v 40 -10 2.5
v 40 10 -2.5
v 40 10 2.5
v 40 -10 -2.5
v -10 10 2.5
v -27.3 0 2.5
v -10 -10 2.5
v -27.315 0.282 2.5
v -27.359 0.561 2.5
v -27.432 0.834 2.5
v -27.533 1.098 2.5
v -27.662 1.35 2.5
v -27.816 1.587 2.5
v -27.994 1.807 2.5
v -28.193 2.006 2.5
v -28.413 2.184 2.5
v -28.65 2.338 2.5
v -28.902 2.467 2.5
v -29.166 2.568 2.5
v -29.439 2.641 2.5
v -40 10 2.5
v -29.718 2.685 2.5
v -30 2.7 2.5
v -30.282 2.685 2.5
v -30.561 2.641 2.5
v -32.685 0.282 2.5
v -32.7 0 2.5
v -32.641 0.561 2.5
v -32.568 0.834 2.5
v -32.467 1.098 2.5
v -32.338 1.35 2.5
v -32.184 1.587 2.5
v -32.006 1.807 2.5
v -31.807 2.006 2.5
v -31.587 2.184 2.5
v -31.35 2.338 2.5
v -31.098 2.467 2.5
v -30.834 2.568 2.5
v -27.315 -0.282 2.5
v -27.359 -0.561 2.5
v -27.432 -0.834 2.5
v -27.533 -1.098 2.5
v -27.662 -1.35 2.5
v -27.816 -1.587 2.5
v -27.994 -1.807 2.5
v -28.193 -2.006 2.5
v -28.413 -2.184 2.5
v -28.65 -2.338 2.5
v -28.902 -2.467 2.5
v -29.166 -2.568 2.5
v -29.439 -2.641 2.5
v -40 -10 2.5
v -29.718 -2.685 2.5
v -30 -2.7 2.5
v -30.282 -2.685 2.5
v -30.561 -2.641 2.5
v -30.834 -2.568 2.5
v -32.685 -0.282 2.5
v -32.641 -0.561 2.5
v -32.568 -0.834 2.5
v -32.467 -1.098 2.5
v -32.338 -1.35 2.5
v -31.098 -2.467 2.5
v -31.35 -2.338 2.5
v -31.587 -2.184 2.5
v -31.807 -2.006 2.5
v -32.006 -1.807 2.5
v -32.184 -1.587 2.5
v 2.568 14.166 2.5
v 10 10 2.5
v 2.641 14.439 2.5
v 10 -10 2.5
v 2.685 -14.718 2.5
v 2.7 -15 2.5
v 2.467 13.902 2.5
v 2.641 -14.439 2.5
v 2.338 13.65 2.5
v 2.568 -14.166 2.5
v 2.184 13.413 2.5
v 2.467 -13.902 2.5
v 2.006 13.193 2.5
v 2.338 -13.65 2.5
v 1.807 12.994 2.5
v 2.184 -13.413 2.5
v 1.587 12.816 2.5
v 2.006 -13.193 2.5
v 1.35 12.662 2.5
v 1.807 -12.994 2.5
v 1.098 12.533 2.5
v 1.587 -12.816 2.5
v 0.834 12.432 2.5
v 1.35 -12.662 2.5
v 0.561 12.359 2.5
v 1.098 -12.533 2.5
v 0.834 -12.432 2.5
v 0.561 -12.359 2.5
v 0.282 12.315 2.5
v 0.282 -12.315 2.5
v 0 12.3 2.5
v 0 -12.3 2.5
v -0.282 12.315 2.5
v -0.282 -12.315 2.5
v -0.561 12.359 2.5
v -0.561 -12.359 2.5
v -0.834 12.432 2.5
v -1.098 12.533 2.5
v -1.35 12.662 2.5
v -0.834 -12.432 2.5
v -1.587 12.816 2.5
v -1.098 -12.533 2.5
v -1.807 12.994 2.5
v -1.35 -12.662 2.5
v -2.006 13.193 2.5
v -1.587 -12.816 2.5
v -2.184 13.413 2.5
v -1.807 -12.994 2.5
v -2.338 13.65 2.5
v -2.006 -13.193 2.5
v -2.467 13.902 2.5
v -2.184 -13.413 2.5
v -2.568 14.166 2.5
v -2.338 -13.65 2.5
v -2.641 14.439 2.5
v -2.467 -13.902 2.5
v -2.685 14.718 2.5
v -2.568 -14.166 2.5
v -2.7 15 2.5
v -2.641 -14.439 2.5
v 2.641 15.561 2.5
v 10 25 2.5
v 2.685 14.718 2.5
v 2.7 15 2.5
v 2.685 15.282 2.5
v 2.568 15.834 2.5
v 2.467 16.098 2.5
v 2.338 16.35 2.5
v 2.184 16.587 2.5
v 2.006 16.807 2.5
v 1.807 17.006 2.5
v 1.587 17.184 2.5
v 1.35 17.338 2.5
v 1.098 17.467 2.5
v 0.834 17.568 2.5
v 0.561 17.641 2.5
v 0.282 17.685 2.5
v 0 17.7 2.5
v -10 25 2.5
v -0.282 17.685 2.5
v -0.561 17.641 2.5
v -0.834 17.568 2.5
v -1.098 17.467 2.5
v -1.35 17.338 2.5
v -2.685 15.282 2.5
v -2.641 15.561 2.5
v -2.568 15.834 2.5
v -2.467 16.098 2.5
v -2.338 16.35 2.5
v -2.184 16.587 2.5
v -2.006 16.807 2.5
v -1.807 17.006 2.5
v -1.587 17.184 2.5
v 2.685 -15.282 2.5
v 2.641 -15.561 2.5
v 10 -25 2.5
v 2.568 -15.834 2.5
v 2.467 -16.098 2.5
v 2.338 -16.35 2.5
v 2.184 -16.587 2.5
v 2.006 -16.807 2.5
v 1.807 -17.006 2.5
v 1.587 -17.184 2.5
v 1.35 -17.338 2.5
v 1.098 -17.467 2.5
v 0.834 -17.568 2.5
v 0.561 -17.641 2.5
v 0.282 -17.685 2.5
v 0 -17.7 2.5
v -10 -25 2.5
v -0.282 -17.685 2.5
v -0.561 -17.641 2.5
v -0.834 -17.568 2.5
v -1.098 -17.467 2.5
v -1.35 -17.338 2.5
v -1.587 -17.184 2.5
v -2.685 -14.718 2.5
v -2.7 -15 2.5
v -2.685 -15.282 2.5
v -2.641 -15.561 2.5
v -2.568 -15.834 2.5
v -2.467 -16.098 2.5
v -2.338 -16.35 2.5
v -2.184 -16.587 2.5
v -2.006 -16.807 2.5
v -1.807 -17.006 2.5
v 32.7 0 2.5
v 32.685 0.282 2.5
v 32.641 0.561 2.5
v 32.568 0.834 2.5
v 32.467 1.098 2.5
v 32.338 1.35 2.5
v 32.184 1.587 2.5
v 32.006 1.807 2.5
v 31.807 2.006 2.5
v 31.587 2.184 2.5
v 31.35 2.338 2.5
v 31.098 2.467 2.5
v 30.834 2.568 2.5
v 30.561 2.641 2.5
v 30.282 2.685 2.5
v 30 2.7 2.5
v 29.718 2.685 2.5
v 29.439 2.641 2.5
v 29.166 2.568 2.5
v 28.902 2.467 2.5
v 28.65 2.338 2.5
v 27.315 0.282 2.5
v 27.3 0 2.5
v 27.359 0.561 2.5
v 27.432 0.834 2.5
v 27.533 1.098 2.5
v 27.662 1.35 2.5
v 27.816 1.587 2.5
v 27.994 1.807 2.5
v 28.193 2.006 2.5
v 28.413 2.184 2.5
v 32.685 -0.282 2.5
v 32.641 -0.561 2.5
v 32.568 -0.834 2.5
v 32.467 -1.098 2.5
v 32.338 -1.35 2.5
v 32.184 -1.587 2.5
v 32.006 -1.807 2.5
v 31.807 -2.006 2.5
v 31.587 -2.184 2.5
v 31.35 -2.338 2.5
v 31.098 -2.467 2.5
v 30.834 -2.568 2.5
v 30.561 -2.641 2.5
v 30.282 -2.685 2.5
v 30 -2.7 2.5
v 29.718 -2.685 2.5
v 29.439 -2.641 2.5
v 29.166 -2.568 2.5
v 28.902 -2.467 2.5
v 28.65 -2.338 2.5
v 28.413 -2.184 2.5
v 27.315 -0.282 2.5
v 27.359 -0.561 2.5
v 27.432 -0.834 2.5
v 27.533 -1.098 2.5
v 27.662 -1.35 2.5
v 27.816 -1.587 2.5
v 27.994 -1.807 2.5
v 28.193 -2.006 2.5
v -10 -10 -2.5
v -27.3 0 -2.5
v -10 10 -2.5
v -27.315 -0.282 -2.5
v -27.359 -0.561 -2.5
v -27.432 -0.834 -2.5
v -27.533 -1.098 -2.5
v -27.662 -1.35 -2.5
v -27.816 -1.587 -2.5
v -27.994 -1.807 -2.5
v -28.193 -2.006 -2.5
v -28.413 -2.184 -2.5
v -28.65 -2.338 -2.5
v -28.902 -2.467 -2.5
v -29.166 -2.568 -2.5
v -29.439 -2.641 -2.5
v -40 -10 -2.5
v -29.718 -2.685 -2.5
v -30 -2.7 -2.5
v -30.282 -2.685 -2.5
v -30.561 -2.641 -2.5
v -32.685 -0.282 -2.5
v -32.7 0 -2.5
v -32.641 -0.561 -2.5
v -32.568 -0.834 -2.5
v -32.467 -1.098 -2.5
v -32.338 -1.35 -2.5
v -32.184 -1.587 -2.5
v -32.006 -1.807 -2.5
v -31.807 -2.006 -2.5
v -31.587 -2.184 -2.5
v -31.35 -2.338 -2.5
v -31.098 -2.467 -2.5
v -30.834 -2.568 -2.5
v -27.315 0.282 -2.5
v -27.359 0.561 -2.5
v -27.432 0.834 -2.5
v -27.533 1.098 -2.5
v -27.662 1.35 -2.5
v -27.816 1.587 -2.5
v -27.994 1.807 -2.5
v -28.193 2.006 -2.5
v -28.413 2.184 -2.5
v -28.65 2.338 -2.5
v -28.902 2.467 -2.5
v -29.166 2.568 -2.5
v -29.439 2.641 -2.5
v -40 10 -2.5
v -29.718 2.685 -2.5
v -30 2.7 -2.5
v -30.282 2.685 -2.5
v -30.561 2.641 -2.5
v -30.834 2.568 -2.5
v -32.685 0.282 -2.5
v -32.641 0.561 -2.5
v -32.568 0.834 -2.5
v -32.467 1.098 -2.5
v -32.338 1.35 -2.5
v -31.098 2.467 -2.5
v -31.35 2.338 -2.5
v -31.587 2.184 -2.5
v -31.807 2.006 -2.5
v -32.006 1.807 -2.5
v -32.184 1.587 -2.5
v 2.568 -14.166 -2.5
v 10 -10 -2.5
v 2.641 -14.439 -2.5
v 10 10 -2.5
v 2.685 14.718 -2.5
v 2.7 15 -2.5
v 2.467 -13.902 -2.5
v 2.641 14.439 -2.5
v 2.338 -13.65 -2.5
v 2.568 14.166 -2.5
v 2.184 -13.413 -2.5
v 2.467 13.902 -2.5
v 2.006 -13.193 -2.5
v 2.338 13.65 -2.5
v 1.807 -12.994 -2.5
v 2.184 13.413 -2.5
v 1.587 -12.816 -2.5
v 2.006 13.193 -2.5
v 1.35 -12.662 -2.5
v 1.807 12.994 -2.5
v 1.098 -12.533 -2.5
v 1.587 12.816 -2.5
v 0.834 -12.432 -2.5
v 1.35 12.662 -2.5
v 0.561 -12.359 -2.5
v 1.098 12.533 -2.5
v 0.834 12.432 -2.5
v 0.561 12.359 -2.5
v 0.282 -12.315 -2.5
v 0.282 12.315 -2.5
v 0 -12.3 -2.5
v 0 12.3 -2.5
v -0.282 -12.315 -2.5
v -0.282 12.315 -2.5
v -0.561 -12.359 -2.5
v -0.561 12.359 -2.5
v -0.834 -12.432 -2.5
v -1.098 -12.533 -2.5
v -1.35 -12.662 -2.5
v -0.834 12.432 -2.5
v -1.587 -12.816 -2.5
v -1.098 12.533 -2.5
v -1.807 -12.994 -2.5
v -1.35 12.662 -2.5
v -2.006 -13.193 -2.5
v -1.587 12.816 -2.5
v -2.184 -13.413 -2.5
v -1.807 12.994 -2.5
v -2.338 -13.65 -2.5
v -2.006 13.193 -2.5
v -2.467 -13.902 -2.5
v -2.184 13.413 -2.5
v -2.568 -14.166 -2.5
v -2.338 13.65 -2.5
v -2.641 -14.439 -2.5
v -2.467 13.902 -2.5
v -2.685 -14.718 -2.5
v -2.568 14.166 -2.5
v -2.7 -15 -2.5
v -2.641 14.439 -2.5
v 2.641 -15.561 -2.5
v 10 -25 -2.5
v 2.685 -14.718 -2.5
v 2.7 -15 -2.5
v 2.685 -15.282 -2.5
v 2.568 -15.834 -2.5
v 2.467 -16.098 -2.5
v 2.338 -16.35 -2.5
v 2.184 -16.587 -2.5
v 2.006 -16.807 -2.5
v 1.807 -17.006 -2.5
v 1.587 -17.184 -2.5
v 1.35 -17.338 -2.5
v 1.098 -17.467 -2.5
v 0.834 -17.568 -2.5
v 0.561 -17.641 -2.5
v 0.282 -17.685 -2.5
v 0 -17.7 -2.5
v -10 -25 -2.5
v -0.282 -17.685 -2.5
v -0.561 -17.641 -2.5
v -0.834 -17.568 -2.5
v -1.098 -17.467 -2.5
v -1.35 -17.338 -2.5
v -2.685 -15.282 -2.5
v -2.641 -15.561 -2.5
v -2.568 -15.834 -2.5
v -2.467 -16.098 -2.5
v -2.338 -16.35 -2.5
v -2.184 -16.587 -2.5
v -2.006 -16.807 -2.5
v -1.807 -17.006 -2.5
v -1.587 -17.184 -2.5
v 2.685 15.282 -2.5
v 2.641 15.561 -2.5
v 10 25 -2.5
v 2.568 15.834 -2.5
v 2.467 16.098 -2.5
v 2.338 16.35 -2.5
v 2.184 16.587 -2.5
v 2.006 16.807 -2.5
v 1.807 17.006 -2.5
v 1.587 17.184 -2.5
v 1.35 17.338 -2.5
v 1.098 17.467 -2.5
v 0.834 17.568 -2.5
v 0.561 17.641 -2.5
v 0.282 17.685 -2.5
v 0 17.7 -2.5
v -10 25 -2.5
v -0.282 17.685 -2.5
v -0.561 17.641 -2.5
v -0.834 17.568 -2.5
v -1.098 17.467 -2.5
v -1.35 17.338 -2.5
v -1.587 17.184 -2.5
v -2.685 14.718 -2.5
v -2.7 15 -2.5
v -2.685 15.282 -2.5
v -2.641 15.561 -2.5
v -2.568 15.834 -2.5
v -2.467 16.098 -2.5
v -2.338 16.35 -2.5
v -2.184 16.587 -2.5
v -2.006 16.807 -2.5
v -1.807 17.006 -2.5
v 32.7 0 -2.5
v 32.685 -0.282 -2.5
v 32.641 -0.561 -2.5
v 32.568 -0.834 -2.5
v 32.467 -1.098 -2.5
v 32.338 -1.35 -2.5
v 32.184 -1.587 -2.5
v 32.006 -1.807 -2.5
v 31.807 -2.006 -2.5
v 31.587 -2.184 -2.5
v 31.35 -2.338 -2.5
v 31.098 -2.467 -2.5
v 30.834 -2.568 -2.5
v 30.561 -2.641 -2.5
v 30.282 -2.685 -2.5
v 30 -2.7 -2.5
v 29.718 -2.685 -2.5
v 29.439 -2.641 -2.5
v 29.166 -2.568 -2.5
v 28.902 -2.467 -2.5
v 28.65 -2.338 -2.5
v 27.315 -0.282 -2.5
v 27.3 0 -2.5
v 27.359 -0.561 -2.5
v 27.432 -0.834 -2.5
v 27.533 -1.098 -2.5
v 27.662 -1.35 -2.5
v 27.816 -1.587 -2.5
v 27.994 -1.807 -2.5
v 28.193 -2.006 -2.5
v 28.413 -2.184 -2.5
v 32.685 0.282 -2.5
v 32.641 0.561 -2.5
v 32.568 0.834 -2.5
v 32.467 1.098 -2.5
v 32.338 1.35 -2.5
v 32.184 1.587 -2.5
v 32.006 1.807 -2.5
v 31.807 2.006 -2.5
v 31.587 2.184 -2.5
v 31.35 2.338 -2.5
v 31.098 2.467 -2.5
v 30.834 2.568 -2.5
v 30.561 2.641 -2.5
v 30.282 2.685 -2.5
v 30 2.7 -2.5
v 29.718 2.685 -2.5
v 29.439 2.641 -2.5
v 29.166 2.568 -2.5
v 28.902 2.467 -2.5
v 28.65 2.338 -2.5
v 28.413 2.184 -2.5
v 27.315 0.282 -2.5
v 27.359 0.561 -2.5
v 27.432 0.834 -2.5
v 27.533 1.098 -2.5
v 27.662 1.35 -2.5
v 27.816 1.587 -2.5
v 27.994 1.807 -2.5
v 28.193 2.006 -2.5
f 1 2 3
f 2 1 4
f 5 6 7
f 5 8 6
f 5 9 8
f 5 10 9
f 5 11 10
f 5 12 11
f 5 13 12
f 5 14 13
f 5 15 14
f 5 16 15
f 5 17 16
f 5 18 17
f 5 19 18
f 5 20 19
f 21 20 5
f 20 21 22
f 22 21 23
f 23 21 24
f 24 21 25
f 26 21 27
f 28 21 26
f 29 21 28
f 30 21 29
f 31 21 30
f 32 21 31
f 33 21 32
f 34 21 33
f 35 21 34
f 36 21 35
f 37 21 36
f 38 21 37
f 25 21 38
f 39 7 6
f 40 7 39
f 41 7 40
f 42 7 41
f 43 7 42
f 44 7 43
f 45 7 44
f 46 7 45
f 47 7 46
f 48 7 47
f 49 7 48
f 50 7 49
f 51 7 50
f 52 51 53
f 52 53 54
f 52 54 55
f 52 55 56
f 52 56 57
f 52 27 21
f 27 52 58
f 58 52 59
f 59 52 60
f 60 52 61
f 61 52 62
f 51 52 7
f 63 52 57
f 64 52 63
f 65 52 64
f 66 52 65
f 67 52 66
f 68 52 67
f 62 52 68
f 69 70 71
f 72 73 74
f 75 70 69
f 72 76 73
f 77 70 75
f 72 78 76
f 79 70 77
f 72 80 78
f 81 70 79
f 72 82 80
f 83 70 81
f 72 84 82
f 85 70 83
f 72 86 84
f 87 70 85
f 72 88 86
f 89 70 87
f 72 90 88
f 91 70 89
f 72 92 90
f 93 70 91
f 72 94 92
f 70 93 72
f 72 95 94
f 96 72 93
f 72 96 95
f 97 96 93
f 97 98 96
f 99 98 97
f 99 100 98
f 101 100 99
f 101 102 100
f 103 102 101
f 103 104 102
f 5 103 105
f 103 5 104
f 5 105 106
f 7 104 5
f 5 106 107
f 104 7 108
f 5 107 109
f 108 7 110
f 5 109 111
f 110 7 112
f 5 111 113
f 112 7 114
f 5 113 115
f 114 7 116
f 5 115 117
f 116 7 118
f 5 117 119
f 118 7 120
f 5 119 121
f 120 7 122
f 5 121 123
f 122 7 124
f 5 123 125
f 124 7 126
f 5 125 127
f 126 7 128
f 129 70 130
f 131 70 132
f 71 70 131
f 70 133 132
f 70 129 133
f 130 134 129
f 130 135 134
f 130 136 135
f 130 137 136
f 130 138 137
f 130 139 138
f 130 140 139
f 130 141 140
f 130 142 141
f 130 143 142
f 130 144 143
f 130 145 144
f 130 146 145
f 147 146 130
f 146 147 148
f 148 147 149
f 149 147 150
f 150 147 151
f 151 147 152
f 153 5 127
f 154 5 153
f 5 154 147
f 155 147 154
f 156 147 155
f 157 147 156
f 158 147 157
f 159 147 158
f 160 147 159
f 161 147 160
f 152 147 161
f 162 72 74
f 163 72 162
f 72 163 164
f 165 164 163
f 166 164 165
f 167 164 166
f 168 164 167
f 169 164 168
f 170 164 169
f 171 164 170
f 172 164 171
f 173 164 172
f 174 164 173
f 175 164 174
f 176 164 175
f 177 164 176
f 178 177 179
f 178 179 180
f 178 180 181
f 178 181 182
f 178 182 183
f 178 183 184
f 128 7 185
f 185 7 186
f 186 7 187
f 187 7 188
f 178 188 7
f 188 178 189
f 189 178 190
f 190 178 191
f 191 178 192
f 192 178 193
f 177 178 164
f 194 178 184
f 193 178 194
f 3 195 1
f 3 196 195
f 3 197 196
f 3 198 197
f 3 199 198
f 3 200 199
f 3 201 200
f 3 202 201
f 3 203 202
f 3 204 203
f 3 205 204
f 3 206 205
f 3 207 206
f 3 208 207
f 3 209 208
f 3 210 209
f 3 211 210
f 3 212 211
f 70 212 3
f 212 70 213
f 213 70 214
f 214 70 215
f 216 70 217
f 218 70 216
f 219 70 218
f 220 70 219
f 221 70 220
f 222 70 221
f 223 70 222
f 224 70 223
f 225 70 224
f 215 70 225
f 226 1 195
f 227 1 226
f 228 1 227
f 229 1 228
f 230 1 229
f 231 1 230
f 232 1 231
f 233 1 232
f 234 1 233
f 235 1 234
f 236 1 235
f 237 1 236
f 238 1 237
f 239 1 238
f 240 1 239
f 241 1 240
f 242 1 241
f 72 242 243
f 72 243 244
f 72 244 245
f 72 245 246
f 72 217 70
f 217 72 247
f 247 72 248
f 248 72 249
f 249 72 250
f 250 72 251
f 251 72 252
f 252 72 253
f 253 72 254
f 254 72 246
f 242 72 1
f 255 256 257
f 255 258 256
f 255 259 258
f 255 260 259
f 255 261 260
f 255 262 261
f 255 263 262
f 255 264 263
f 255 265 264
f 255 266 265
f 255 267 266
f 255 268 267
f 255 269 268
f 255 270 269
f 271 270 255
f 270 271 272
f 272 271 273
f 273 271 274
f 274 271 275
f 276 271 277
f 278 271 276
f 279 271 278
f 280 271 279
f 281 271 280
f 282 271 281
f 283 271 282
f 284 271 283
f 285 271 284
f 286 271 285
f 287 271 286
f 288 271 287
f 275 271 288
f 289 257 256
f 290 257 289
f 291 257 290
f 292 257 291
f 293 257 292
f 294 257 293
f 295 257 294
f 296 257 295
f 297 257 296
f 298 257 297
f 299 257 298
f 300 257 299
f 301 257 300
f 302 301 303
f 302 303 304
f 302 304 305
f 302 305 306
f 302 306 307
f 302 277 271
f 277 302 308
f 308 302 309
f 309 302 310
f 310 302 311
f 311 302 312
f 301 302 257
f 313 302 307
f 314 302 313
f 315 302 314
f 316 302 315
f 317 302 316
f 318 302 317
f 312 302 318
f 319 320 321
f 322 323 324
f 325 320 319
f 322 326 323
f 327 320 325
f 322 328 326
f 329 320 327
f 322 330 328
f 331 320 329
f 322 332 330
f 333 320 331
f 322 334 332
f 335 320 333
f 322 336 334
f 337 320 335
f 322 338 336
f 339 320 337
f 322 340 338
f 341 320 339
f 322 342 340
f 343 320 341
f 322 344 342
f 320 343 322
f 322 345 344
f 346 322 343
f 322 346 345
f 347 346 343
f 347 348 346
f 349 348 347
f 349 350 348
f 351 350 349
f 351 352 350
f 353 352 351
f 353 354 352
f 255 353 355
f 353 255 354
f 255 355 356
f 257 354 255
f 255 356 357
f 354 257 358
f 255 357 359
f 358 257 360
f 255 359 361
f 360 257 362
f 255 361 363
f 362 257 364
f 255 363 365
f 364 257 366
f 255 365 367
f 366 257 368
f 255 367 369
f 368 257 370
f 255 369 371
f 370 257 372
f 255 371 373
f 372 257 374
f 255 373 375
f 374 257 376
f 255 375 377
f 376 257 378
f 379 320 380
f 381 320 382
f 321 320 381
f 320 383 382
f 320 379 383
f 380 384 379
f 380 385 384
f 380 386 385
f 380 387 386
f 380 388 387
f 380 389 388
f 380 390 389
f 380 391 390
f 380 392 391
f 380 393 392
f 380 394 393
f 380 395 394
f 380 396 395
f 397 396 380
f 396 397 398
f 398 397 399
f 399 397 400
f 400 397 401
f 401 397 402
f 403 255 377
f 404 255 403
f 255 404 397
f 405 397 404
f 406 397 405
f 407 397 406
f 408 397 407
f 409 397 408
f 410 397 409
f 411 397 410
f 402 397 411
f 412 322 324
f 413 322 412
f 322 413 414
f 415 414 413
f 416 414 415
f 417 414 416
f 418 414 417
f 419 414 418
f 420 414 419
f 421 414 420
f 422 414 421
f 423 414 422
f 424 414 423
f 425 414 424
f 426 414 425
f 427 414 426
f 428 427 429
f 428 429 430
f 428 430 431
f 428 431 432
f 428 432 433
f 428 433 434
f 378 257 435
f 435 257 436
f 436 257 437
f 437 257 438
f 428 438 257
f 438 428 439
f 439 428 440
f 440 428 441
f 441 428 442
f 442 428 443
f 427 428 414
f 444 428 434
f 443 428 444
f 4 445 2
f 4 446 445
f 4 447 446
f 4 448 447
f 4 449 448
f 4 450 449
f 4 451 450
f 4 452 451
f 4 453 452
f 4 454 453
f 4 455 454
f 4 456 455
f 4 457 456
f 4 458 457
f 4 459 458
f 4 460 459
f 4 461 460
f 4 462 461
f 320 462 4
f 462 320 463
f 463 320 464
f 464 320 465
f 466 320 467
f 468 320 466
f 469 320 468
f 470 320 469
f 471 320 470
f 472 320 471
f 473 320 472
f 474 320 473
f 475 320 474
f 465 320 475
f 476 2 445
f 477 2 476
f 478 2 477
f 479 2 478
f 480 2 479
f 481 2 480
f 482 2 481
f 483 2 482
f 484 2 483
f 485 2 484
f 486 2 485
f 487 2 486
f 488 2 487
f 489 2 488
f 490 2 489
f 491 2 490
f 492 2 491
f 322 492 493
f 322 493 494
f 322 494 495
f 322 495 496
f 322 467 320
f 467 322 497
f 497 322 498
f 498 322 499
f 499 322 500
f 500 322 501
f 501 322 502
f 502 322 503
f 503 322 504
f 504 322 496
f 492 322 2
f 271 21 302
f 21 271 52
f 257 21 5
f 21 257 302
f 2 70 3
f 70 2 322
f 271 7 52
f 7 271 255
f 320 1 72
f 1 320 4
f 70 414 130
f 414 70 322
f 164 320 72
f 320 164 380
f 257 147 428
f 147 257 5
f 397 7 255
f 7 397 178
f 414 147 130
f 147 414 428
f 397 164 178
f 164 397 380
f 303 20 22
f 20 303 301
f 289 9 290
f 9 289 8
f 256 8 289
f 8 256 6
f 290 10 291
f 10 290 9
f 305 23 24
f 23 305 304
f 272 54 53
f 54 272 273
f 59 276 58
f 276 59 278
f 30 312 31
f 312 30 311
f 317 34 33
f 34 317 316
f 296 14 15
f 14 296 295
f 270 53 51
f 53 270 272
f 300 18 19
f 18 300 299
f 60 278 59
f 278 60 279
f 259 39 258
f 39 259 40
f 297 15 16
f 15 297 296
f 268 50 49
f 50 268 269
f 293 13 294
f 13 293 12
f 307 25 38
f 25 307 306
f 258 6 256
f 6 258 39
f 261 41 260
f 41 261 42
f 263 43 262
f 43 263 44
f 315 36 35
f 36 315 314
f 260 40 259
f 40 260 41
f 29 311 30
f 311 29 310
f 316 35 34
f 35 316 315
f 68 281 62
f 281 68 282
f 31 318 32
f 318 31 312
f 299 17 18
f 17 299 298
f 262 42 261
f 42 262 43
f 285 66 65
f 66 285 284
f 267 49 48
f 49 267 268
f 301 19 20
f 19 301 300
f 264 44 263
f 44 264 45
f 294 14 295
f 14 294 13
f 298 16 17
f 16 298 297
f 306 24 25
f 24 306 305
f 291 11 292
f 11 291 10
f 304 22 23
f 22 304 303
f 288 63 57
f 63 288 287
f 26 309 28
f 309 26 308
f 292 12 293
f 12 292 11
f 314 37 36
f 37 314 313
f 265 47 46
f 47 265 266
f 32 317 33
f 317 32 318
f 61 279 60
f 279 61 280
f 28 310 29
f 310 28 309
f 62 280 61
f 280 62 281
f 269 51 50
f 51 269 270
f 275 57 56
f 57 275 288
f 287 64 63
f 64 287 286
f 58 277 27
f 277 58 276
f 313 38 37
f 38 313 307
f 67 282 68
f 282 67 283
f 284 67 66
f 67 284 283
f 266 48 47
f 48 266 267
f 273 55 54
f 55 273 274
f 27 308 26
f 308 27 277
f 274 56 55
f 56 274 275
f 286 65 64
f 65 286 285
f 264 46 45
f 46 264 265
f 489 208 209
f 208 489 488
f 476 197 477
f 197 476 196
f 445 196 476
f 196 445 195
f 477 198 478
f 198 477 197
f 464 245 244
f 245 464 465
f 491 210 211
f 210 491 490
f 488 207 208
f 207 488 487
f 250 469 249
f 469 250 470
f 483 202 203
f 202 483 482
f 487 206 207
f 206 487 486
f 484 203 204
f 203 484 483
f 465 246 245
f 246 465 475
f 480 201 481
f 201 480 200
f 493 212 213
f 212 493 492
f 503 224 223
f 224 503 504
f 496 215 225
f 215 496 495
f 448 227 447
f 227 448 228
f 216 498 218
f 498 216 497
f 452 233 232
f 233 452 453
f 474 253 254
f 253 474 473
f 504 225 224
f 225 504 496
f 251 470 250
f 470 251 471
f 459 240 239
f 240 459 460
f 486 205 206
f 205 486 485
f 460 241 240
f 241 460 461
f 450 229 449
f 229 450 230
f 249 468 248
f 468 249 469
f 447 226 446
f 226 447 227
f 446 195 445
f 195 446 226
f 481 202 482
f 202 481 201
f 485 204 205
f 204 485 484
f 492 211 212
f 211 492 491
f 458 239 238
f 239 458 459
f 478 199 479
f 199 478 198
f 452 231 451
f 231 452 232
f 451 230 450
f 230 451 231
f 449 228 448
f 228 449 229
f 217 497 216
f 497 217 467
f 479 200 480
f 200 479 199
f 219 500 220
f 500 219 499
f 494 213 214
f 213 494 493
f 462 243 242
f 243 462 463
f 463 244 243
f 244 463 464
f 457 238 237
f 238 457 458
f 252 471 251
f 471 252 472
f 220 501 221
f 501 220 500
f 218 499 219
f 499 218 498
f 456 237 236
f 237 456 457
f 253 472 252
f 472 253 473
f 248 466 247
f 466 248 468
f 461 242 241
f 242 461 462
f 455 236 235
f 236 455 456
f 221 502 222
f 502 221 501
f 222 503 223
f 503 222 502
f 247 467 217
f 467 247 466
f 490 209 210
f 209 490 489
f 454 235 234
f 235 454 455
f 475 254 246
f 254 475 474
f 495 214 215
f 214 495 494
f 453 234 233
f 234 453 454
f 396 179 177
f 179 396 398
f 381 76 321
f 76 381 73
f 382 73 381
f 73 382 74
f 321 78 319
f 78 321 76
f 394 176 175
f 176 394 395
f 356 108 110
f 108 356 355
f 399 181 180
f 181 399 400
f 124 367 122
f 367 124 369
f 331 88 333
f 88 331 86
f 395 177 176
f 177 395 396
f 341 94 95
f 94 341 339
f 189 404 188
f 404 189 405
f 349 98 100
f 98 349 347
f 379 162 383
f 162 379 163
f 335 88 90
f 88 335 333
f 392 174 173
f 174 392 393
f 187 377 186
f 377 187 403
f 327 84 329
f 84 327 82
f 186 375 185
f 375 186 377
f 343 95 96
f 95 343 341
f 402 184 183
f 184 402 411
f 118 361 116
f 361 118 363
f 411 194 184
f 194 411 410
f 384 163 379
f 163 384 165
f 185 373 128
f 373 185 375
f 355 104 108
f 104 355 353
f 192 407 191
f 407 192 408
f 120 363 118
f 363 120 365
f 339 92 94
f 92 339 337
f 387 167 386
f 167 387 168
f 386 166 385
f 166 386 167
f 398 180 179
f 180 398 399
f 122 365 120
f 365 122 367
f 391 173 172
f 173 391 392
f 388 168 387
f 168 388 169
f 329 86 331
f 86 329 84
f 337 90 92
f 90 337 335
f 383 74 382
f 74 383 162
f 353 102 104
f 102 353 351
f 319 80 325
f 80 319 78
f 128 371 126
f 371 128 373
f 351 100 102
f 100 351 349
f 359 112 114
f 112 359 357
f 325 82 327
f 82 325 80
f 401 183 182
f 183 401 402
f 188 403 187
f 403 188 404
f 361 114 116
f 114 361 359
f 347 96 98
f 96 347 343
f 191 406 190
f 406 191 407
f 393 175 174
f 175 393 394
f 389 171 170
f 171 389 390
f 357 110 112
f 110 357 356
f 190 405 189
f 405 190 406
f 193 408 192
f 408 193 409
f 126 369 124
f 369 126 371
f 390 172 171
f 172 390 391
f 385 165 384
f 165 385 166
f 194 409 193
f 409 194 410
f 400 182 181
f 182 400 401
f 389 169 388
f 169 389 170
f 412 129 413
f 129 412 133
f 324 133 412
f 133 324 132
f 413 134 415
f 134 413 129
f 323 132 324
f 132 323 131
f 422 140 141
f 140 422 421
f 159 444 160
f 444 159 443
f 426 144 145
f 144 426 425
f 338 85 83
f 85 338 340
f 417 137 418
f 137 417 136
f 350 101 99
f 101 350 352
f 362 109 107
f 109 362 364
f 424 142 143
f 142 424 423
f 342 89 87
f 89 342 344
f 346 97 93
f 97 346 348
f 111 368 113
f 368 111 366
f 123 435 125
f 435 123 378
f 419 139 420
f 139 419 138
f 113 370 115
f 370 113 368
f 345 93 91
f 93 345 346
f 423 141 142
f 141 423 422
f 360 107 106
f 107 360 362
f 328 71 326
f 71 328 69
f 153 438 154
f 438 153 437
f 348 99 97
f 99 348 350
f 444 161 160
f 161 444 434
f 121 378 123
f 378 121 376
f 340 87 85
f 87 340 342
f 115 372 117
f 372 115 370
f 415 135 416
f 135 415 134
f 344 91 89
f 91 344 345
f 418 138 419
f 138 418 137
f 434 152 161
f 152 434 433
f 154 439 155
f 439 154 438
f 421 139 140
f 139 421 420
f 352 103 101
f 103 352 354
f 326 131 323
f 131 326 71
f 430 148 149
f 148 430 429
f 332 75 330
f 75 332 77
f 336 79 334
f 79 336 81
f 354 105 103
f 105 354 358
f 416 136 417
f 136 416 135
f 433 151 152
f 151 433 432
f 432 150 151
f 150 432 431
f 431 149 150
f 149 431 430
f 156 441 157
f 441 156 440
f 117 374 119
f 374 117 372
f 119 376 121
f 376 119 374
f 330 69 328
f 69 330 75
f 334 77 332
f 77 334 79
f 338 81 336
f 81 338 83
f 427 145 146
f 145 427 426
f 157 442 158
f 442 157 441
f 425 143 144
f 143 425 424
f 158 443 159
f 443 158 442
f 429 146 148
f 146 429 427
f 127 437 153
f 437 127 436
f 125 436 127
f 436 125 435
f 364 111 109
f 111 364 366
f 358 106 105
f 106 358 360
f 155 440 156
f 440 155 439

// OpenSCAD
// T-shaped mounting plate.
$fn = 60;
eps = 0.02;
stem_l = 80;
arm_l = 50;
width = 20;
thickness = 5;
difference() {
    union() { cube([stem_l,width,thickness],center=true); cube([width,arm_l,thickness],center=true); }
    for (p=[[-stem_l/2+10,0],[stem_l/2-10,0],[0,-arm_l/2+10],[0,arm_l/2-10]]) translate([p[0],p[1],-thickness/2-eps]) cylinder(d=5.4,h=thickness+2*eps);
}
